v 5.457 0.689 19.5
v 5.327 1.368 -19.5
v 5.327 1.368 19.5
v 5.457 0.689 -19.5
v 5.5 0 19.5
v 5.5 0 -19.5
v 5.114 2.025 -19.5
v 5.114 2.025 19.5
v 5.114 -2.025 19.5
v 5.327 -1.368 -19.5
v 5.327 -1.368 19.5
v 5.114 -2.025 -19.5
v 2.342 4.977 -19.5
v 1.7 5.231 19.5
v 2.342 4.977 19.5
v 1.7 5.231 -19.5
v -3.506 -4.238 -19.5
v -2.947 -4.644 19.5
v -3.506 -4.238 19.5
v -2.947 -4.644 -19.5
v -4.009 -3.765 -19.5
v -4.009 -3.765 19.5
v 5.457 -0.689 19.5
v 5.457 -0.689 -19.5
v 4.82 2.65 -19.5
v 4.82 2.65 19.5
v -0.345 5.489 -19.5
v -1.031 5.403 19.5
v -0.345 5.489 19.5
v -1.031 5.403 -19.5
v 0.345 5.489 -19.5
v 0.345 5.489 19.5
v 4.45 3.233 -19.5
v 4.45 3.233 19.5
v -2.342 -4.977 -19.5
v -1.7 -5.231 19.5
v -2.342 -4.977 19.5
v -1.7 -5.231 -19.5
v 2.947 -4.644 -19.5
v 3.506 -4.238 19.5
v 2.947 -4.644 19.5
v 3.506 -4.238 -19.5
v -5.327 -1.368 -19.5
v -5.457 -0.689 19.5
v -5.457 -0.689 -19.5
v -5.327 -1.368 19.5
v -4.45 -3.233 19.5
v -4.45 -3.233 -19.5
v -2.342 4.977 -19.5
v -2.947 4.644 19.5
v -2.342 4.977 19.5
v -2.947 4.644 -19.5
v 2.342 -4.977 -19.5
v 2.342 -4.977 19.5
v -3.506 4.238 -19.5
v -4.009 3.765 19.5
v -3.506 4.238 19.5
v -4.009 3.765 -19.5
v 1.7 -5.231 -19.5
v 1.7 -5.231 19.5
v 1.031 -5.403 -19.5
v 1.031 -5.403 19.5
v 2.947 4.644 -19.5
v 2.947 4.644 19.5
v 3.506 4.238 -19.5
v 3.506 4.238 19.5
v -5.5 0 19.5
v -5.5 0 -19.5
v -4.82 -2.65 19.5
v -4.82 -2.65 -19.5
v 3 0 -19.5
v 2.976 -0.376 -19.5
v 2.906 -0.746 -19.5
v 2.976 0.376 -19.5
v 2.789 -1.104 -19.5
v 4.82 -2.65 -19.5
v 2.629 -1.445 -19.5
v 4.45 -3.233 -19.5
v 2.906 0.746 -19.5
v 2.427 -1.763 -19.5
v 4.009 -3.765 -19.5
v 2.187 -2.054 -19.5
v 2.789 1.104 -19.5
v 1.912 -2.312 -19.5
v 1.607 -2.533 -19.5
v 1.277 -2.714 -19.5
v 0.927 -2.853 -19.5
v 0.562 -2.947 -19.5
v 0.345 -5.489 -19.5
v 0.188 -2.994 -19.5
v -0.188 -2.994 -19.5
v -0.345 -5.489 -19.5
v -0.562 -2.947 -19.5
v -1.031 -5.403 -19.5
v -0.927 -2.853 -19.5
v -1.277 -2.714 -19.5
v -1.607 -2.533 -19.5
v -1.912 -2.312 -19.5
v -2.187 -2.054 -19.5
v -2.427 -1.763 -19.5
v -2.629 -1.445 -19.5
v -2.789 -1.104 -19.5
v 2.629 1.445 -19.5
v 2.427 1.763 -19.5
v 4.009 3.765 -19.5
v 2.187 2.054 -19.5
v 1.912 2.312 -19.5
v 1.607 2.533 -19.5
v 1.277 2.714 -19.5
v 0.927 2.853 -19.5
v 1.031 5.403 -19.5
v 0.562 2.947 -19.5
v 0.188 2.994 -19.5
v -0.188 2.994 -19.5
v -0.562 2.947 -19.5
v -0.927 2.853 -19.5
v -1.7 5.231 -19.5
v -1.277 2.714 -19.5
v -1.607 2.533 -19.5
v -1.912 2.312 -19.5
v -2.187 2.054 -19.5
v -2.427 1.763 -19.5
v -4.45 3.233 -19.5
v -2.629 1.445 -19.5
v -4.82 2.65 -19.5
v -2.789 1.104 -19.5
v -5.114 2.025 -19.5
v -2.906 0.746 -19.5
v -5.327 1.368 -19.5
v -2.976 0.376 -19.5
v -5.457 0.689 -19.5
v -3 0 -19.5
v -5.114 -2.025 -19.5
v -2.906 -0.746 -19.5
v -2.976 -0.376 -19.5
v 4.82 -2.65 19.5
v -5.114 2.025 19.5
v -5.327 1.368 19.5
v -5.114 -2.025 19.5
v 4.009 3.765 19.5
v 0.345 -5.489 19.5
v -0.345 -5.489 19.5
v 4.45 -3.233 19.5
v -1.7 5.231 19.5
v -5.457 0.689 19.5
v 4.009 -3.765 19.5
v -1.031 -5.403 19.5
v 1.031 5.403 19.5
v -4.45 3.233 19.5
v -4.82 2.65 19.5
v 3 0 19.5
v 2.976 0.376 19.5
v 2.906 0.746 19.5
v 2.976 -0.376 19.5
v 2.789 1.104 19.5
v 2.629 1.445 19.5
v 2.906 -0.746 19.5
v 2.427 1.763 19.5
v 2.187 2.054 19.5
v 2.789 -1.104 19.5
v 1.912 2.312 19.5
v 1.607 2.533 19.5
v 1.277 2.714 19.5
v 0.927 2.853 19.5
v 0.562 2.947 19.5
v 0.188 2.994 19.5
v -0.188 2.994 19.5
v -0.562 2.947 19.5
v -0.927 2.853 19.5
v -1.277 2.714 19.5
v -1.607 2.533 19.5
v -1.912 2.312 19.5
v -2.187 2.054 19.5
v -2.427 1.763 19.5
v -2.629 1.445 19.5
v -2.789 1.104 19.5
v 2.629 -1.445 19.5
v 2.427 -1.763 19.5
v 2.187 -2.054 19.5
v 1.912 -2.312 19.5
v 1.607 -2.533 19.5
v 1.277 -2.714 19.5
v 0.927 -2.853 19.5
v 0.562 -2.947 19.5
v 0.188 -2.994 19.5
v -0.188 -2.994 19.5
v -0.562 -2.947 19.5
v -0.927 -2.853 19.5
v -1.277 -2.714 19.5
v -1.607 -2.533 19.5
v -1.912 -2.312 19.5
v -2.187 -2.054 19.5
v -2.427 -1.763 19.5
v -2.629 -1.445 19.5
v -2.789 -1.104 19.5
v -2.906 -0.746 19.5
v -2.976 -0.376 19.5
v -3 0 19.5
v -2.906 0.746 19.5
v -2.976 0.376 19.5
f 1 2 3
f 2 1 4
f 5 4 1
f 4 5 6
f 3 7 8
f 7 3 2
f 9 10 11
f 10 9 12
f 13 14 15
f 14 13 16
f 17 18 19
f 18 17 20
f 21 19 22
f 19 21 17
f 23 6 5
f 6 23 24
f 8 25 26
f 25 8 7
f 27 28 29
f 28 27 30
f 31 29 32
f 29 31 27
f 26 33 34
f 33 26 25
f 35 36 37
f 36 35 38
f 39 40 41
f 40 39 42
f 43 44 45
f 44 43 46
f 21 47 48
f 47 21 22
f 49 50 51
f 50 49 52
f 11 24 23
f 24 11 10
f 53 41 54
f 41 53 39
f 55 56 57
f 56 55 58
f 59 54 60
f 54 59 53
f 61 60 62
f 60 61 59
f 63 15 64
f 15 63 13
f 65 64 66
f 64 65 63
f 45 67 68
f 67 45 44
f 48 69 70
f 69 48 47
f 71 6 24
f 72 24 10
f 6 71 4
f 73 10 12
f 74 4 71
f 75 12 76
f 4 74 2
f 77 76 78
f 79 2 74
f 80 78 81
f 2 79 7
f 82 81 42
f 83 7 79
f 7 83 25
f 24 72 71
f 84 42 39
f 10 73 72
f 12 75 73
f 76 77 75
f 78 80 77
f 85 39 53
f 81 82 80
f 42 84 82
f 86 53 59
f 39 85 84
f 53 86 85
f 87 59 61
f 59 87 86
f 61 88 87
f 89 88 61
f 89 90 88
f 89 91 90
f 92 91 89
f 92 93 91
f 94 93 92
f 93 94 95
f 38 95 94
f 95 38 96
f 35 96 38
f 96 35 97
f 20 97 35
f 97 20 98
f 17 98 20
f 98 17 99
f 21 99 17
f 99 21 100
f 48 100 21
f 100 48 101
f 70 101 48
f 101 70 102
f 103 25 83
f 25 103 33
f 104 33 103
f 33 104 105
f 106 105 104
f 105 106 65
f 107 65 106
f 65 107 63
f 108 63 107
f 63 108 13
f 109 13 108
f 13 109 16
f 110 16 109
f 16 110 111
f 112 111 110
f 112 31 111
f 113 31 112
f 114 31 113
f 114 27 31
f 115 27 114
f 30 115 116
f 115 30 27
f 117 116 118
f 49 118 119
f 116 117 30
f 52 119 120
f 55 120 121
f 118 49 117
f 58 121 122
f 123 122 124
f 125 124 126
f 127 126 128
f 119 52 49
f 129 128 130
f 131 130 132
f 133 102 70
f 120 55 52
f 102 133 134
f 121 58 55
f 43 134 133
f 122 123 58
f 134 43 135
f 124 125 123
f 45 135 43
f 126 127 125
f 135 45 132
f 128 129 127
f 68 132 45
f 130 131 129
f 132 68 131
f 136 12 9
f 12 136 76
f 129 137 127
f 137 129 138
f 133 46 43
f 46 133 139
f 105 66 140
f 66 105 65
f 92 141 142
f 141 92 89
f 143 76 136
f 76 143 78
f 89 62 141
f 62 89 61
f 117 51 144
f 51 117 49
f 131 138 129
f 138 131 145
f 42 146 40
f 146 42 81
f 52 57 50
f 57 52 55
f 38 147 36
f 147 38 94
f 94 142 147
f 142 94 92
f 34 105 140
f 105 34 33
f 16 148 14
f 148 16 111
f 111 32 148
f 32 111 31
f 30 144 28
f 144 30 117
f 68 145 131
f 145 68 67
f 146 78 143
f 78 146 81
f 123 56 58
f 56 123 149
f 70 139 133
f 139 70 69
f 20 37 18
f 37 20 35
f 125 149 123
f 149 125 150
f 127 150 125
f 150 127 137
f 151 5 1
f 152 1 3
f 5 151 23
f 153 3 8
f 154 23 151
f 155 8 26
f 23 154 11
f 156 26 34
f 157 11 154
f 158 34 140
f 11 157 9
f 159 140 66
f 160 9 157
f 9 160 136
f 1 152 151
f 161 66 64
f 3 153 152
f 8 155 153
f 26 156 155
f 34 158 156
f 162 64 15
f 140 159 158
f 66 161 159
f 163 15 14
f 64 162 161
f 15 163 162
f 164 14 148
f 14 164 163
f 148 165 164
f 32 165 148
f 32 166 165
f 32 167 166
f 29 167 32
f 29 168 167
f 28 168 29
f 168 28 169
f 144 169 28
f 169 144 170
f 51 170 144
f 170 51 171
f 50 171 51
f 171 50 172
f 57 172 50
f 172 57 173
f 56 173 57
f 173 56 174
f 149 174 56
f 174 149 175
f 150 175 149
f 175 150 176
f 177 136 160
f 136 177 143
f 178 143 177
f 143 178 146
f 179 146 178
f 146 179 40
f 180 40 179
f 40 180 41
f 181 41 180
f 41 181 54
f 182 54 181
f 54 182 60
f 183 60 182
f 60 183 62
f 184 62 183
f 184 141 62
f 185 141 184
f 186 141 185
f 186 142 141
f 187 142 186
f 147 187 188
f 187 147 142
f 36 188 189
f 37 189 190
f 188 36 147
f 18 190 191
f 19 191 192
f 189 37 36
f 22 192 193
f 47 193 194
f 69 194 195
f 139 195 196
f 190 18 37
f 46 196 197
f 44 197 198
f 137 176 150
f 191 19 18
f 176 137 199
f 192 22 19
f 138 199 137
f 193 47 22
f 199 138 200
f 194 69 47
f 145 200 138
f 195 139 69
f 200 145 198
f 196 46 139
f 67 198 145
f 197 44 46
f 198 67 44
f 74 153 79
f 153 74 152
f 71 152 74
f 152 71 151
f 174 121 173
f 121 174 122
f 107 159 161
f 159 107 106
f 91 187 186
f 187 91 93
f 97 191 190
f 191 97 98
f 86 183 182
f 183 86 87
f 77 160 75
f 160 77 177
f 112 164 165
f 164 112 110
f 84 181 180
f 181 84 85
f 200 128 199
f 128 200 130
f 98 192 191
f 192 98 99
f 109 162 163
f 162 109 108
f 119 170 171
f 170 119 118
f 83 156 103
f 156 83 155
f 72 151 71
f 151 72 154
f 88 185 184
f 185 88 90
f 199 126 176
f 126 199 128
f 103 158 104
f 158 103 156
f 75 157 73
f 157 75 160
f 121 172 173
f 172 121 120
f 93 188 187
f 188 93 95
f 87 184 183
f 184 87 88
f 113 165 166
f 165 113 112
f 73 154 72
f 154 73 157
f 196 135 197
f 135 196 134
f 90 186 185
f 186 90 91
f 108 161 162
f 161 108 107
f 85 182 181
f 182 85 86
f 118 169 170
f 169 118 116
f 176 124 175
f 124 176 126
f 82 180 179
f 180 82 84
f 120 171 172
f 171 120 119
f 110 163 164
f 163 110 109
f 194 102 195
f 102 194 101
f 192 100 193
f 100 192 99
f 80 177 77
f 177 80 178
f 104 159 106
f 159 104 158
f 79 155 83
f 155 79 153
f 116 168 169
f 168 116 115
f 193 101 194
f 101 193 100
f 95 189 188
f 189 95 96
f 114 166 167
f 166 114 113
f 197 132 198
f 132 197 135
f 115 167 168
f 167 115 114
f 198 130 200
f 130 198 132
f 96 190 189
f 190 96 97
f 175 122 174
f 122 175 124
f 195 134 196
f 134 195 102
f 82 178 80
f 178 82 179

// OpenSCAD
$fn = 50;


difference() {
	union() {
		translate(v = [0, 0, -19.5000000000]) {
			cylinder(h = 39, r = 5.5000000000);
		}
	}
	union() {
		translate(v = [0, 0, -100.0000000000]) {
			cylinder(h = 200, r = 3.0000000000);
		}
	}
}
